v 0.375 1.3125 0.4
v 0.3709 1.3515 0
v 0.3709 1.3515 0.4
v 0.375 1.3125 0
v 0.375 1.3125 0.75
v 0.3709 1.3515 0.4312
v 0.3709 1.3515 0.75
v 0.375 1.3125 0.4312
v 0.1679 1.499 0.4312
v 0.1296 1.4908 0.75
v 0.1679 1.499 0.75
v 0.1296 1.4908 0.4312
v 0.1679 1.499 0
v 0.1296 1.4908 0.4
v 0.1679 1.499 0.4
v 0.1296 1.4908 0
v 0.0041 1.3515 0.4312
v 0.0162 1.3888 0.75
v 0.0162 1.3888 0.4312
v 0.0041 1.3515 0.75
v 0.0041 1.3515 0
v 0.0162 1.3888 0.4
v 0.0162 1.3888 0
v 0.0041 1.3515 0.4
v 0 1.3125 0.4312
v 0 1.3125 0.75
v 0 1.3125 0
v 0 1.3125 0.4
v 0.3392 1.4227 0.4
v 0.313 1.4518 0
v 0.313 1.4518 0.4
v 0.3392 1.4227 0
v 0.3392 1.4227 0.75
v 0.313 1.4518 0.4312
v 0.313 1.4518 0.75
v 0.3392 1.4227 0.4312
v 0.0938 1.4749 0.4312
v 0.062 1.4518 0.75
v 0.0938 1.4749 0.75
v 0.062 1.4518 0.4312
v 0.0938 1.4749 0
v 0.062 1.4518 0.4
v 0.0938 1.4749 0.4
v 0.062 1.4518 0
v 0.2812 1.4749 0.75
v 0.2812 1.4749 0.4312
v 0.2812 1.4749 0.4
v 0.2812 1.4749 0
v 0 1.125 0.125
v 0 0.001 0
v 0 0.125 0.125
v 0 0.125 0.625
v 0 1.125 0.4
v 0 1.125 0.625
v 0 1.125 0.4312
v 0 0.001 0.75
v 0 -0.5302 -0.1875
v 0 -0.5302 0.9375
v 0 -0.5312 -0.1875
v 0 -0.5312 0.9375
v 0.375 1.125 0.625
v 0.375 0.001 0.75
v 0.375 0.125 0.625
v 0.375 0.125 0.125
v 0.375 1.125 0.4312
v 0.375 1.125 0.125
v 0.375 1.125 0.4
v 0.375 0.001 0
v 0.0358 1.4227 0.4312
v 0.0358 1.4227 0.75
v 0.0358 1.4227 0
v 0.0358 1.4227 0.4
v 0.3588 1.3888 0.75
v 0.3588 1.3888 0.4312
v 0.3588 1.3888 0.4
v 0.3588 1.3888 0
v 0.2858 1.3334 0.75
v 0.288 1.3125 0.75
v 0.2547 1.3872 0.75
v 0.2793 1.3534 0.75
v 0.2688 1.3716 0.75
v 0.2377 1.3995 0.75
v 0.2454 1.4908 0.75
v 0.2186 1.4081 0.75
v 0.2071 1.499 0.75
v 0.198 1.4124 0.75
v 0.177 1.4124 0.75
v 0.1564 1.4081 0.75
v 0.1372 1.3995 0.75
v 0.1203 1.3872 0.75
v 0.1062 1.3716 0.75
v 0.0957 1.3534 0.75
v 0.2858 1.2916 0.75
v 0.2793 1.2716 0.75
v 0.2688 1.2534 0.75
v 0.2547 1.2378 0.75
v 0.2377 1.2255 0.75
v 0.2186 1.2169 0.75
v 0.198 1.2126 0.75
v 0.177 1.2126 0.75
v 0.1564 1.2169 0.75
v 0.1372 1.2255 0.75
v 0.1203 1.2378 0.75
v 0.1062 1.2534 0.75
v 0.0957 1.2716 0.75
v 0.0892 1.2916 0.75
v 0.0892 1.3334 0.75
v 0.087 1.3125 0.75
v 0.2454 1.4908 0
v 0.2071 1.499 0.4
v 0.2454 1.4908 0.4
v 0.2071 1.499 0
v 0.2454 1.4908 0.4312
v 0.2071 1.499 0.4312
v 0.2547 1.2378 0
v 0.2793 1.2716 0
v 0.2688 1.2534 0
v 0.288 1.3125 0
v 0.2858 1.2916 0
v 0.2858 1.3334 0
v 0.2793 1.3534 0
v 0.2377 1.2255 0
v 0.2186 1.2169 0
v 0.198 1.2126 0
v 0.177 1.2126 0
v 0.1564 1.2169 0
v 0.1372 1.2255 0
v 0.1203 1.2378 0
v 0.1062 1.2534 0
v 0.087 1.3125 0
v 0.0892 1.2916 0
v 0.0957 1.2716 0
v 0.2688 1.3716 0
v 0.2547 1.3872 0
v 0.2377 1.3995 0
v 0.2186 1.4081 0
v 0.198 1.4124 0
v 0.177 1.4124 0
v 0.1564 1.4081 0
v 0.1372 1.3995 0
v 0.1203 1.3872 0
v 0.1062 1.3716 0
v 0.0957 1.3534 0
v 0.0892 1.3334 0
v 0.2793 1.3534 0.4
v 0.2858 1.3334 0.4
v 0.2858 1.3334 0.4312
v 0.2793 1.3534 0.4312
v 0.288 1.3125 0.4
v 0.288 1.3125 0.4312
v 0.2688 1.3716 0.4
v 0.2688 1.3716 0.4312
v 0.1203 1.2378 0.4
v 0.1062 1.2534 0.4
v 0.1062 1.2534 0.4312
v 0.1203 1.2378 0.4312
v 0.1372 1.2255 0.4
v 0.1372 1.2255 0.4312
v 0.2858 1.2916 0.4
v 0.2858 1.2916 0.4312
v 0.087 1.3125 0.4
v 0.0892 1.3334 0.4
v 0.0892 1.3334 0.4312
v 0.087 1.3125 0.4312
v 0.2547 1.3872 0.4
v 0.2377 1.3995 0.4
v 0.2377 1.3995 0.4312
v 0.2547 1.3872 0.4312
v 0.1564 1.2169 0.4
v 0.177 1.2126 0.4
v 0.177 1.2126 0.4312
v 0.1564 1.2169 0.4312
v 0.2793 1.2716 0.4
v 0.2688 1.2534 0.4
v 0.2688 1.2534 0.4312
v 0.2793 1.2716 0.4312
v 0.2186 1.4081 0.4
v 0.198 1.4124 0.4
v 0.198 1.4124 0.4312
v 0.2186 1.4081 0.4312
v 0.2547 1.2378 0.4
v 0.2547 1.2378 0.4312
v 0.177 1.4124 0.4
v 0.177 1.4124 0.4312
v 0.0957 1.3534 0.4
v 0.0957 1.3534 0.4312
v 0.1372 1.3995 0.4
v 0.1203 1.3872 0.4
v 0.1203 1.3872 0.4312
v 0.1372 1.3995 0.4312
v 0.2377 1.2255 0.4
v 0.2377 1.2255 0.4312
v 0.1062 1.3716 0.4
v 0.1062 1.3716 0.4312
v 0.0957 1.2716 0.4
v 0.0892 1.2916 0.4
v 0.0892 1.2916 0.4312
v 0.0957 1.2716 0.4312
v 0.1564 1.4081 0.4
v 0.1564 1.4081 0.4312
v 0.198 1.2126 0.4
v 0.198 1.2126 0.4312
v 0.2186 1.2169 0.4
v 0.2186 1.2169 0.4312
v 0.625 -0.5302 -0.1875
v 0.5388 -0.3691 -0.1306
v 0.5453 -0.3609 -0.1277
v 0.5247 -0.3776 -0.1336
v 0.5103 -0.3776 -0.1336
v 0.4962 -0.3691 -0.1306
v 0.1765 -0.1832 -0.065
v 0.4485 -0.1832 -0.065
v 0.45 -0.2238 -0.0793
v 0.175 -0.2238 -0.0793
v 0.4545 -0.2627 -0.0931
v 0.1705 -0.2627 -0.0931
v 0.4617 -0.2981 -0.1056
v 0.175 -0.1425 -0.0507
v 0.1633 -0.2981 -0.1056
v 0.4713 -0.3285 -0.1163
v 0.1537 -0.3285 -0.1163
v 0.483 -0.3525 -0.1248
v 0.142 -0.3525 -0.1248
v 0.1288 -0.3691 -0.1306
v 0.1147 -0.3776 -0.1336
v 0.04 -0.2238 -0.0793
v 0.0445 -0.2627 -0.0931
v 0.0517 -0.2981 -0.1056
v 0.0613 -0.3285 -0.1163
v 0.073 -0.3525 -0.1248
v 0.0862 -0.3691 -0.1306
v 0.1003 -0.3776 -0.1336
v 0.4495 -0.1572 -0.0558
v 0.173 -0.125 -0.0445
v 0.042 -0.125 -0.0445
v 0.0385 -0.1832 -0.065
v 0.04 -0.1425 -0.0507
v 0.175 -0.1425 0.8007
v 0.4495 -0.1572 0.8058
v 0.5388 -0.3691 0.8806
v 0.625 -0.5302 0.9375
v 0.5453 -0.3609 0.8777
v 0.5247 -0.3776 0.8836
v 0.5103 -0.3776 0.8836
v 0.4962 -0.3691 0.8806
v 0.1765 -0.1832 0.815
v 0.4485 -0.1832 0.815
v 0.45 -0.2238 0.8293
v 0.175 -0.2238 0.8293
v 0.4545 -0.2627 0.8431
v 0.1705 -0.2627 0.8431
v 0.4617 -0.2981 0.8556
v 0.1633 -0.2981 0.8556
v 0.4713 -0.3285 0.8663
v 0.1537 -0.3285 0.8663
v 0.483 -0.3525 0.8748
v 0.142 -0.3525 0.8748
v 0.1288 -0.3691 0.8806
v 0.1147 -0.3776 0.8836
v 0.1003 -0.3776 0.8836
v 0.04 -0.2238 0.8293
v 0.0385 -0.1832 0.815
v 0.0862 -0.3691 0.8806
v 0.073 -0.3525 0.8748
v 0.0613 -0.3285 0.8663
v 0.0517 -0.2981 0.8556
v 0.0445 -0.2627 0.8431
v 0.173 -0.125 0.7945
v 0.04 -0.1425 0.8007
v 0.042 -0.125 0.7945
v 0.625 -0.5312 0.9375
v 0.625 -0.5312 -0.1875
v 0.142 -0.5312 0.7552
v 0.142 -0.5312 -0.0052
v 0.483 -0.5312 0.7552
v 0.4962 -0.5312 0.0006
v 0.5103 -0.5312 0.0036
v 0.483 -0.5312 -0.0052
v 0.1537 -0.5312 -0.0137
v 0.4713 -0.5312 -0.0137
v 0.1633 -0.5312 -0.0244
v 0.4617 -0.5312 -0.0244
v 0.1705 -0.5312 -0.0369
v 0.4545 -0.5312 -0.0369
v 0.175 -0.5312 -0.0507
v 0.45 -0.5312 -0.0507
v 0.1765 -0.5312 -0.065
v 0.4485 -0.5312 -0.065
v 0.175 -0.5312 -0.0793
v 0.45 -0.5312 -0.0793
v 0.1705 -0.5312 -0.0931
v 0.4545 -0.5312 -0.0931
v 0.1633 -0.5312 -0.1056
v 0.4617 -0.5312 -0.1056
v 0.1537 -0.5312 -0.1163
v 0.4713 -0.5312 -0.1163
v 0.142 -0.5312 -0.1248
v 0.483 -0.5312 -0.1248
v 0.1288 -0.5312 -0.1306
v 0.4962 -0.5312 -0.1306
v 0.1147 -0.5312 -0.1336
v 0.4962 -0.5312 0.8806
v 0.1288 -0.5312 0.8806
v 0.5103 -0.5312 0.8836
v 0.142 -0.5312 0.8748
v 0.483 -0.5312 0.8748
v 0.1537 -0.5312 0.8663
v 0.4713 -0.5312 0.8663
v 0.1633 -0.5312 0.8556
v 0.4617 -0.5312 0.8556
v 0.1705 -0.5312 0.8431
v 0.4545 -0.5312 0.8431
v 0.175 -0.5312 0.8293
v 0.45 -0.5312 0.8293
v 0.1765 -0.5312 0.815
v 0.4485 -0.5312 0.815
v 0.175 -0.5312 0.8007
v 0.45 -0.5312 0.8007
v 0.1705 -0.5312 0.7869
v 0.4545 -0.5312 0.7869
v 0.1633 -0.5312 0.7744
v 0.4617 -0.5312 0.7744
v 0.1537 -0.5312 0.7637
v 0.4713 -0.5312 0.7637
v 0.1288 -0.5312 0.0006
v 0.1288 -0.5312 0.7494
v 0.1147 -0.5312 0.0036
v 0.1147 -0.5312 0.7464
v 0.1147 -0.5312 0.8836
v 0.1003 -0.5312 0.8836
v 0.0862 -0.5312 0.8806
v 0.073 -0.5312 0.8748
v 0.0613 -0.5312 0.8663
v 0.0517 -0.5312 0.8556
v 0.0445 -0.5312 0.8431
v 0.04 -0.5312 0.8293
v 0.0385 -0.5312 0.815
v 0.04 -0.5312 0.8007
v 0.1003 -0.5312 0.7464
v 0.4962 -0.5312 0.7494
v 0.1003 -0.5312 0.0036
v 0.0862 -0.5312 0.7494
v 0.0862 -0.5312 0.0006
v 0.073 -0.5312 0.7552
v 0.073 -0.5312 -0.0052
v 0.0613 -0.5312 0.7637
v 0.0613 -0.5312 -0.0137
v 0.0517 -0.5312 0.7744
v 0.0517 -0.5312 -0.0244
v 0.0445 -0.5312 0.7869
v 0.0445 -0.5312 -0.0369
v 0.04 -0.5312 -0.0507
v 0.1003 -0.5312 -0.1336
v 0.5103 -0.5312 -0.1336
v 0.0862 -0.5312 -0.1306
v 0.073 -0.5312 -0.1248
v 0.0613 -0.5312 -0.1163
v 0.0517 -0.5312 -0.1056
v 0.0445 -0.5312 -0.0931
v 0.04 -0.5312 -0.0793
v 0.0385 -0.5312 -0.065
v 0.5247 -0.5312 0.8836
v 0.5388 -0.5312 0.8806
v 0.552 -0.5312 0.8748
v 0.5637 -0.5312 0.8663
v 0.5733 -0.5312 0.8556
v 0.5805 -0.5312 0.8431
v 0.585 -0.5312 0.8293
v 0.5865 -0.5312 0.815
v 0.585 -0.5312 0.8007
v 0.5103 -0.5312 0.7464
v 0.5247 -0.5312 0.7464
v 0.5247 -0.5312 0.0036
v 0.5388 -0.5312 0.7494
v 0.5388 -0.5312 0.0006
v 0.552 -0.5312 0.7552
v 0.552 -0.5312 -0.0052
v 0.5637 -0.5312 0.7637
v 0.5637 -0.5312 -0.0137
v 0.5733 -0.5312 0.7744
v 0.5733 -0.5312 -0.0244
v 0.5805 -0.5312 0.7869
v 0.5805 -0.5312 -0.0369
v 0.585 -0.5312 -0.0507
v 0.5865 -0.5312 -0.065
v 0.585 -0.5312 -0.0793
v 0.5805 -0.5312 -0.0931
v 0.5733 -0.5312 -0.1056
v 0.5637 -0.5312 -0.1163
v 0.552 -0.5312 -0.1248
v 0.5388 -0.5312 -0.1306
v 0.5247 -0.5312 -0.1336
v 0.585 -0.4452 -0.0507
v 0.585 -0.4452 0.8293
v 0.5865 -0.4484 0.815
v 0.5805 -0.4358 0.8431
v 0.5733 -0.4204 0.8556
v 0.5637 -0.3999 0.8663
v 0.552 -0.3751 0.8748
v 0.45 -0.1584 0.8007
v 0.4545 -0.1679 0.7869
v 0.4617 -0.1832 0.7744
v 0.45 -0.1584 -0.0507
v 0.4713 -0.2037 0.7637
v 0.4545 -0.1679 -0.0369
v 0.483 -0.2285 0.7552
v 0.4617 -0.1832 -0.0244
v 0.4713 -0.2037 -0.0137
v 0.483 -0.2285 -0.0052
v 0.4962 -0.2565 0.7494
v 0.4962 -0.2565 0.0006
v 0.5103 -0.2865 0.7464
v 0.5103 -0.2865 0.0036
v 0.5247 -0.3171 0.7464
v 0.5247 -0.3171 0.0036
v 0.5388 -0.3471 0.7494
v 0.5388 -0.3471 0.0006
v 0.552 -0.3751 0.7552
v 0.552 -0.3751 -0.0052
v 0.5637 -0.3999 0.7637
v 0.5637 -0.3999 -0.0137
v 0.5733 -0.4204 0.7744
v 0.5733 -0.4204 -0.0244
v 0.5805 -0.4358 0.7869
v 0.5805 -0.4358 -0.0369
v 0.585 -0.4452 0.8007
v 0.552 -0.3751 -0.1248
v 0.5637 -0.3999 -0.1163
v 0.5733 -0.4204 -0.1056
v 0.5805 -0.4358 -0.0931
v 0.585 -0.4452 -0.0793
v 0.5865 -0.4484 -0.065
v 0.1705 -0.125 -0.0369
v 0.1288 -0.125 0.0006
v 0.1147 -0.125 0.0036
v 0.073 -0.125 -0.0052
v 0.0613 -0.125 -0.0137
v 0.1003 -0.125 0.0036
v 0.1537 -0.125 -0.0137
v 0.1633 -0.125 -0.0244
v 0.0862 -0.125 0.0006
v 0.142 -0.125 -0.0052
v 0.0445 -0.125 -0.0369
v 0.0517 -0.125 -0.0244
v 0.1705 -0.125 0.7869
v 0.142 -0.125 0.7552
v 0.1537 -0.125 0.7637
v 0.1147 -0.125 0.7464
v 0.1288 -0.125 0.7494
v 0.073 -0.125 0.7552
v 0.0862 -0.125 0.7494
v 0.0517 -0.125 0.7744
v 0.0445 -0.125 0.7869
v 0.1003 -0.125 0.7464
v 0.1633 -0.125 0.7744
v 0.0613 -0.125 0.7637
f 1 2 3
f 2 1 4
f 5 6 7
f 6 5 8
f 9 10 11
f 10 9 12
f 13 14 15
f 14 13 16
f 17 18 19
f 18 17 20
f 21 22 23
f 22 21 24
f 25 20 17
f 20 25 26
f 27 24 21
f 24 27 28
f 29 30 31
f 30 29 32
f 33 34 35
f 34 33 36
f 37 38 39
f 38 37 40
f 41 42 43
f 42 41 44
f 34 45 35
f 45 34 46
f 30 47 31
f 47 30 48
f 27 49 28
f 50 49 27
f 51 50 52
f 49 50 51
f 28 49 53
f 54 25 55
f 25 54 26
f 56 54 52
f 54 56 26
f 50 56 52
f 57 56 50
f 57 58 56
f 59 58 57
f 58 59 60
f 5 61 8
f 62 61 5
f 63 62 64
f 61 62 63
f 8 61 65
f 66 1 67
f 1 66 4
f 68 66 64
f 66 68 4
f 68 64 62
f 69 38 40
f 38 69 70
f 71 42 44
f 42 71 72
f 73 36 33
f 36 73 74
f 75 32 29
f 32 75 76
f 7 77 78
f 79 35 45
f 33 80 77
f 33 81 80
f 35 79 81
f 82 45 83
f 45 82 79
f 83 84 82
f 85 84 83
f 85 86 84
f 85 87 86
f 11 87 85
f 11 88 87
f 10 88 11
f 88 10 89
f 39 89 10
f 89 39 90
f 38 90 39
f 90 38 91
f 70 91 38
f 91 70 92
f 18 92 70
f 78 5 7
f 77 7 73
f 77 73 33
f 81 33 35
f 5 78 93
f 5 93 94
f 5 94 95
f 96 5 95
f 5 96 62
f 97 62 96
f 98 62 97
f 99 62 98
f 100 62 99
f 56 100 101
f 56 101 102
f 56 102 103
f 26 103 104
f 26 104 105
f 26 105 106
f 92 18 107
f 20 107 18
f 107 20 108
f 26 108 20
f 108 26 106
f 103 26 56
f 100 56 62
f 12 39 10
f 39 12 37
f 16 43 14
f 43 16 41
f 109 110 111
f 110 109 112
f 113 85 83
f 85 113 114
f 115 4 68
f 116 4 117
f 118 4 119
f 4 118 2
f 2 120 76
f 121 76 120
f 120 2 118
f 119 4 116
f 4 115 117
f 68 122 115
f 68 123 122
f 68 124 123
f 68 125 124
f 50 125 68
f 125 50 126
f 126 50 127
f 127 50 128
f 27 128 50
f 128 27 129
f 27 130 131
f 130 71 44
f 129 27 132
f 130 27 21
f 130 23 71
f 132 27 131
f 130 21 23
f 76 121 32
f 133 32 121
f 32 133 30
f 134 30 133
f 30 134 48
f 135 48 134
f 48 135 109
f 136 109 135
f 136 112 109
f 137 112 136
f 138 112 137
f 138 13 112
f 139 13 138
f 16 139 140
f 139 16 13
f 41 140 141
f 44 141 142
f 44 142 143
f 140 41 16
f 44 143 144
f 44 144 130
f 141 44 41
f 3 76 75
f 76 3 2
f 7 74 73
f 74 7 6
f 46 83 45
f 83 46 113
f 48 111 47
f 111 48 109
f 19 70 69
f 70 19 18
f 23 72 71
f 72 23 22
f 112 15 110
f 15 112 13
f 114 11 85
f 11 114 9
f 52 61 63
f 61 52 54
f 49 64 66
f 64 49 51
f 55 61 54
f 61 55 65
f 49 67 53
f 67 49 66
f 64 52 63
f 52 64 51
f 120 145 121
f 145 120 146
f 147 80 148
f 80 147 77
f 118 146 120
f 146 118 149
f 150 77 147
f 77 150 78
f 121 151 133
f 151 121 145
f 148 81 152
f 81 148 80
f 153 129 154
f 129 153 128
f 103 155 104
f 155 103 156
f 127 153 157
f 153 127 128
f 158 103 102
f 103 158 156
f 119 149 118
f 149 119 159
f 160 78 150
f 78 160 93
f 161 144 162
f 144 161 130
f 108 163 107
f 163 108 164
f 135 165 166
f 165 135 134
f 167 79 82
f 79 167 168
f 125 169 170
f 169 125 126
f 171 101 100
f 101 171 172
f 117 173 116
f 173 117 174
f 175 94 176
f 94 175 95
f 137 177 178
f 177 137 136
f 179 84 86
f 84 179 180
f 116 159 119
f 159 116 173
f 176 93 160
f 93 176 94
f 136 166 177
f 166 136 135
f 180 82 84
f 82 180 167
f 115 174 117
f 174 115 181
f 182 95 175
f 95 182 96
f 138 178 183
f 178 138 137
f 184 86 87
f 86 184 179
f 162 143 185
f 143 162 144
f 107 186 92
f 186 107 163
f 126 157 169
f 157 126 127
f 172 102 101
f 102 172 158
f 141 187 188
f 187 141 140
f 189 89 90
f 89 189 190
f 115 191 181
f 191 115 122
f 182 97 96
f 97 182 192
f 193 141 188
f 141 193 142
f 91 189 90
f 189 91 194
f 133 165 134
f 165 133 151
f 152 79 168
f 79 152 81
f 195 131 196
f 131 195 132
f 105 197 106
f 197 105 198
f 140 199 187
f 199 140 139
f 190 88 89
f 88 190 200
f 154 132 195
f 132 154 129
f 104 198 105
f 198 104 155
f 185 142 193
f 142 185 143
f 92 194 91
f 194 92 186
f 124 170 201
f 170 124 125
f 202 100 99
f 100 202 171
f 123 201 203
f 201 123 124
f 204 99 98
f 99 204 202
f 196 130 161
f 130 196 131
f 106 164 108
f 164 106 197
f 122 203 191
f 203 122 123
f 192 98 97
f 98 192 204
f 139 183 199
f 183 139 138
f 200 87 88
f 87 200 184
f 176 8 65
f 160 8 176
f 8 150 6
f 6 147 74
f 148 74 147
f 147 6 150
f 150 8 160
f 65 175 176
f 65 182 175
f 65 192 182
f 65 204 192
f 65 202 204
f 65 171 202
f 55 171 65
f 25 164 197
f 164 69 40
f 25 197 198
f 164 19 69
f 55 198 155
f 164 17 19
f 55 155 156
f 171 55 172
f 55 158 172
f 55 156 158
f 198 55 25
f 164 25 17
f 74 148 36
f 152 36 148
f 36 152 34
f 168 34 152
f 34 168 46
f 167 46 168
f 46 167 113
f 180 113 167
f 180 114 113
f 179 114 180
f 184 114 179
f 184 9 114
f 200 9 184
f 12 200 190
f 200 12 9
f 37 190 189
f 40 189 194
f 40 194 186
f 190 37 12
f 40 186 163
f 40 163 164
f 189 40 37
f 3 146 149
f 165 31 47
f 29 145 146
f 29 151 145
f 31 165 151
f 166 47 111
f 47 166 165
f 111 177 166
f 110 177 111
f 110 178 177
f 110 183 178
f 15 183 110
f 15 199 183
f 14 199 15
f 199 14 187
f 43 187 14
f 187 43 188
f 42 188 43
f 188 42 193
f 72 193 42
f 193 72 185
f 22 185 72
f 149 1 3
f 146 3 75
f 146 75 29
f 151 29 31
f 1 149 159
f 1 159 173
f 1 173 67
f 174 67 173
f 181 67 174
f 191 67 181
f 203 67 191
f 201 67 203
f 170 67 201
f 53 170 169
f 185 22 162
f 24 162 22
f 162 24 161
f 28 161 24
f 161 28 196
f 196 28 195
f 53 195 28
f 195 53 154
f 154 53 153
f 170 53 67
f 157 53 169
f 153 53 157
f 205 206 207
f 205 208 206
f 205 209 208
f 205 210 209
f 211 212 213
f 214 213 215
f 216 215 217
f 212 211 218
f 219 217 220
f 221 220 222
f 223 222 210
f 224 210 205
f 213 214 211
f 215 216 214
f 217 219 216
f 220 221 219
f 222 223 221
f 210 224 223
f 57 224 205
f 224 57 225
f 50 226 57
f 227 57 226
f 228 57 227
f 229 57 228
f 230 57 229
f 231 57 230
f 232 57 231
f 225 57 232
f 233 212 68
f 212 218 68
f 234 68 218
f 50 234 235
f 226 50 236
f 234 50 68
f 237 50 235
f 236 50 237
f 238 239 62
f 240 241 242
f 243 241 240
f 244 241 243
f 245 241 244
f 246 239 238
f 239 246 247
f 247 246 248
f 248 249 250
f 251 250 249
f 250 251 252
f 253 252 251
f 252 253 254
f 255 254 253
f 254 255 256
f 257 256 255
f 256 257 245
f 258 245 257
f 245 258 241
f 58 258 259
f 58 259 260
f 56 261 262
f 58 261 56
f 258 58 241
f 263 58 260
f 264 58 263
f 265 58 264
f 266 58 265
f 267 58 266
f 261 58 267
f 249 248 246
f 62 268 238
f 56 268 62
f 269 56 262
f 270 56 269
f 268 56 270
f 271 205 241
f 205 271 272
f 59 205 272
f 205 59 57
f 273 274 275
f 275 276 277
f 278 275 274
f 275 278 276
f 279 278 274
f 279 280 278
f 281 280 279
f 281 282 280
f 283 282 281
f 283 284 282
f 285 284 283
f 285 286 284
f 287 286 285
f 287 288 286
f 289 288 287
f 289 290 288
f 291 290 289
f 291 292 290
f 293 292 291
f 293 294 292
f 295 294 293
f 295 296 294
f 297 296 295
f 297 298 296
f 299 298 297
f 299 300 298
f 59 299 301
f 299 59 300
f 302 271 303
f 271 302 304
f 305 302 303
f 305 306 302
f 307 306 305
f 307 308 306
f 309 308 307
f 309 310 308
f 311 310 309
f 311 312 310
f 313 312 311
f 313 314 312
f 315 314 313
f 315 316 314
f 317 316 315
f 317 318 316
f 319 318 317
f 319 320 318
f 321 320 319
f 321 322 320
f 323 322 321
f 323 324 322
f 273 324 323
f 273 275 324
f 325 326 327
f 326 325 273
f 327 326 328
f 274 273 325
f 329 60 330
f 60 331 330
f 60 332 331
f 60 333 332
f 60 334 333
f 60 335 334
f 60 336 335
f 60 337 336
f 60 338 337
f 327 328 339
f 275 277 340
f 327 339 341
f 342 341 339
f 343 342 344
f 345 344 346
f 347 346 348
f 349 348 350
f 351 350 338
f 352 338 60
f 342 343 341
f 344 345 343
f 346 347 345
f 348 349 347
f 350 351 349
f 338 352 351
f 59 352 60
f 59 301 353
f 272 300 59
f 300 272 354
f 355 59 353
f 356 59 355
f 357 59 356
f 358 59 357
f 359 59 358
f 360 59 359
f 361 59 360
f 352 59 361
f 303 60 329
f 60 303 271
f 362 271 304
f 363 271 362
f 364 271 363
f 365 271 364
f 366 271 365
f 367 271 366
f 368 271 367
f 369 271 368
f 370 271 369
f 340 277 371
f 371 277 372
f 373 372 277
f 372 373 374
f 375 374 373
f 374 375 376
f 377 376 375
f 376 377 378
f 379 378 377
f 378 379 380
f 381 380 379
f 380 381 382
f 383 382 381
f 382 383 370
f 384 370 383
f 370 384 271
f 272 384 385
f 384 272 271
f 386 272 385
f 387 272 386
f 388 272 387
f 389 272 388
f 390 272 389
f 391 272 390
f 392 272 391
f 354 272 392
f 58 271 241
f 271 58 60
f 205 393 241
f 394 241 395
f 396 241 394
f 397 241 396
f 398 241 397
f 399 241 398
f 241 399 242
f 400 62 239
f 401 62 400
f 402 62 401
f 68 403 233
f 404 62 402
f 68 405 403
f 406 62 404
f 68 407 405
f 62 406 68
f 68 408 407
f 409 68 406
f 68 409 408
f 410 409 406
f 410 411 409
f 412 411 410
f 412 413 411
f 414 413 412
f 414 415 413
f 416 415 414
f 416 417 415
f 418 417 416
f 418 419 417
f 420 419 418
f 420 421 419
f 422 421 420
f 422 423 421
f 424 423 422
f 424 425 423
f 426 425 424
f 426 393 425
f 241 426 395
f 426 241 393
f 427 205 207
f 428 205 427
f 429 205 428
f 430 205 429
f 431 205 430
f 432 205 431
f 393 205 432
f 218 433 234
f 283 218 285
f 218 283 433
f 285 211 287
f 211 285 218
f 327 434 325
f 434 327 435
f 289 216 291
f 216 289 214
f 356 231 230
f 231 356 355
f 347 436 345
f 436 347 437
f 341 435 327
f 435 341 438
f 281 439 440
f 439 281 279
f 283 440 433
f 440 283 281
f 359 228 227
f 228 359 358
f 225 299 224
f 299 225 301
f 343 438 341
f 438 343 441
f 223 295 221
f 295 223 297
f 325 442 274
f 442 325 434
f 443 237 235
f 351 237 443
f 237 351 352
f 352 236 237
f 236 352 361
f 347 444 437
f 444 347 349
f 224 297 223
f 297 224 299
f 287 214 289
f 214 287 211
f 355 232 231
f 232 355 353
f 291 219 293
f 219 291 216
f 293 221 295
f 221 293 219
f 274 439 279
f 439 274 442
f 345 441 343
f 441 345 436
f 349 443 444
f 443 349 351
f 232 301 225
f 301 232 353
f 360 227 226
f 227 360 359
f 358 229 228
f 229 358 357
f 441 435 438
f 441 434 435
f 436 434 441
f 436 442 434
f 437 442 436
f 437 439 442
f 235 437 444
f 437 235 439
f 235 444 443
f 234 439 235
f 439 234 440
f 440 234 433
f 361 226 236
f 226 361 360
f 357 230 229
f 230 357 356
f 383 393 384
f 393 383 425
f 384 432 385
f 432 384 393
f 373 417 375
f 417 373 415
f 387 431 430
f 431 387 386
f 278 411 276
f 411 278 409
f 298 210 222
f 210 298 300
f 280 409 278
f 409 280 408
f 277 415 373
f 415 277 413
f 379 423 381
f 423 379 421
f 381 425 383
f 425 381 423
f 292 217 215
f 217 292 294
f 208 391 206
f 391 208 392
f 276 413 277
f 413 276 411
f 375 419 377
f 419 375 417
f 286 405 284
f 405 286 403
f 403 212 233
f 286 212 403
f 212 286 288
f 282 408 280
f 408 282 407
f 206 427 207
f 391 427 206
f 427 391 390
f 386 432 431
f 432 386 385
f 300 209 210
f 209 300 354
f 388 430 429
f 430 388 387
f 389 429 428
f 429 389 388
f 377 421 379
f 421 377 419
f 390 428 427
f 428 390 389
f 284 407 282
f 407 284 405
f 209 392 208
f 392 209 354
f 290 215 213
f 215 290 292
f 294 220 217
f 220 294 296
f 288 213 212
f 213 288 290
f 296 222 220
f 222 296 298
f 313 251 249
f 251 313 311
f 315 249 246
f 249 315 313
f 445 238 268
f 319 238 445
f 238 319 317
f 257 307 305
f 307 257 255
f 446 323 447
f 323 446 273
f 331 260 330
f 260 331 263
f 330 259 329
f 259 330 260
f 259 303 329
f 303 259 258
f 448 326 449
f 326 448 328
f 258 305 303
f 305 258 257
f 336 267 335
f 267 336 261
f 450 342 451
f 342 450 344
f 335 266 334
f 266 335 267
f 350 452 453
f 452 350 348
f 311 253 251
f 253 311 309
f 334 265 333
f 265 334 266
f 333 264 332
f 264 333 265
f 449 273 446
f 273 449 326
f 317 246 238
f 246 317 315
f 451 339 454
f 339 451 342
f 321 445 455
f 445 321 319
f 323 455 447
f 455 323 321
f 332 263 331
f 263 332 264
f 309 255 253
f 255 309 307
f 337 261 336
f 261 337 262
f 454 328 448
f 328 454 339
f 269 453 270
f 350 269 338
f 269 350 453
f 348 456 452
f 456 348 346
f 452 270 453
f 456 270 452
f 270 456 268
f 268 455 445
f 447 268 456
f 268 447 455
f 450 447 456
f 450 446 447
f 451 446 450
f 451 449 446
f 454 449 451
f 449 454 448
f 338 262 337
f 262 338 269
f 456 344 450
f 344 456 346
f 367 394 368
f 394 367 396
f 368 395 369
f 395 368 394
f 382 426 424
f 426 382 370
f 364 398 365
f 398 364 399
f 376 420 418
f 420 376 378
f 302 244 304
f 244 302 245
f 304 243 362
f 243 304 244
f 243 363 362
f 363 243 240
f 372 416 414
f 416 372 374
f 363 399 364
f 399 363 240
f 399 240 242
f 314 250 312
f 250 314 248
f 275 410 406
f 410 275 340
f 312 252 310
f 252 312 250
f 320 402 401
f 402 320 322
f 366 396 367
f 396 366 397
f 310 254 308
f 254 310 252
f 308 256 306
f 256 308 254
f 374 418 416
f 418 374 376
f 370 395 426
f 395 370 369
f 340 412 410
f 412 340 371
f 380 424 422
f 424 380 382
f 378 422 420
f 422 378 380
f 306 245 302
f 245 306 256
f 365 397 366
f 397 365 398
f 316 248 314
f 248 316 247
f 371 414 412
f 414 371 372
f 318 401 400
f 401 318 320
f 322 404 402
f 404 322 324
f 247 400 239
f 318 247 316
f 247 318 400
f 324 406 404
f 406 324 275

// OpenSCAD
$fn = 30;

boltRad = 0.2010/2;

switchWidth = 5/8;
switchHeight = 9/8;

switchPush = 13/16;

boltDifY = 0.88;
boltDifX = 0.41;

screwRad = 0.138/2;

difference() {
    hull() {
        cube([3/8,1,0.75]);
        translate([1.5/8,1.5-(1.5/8)]) cylinder(r=1.5/8,h=0.75);
    }
    
    translate([0,0.125,0.125]) cube([3/8,1,0.5]);
    
    translate([1.5/8,1.5-(1.5/8),0]) cylinder(r=boltRad); 
    
    translate([0,1,0.4]) cube([10,10,(1/32)]);

}

module screwHole(x,y) { 
        translate([x,-0.125,y-(switchHeight-(0.75))/2]) rotate([90,0,0]) cylinder(r=screwRad,h=10);
    }

difference() {
    hull() {
        cube([3/8,0.001,0.75]);

        translate([0,0.125+(2.5/16)-switchPush,-(switchHeight-(0.75))/2]) cube([switchWidth,0.001,switchHeight]);
    }
    
    screwHole(switchWidth/2 - boltDifX/2,switchHeight/2 - boltDifY/2);
    screwHole(switchWidth/2 + boltDifX/2,switchHeight/2 - boltDifY/2);
    screwHole(switchWidth/2 - boltDifX/2,switchHeight/2 + boltDifY/2);
    screwHole(switchWidth/2 + boltDifX/2,switchHeight/2 + boltDifY/2);
}
